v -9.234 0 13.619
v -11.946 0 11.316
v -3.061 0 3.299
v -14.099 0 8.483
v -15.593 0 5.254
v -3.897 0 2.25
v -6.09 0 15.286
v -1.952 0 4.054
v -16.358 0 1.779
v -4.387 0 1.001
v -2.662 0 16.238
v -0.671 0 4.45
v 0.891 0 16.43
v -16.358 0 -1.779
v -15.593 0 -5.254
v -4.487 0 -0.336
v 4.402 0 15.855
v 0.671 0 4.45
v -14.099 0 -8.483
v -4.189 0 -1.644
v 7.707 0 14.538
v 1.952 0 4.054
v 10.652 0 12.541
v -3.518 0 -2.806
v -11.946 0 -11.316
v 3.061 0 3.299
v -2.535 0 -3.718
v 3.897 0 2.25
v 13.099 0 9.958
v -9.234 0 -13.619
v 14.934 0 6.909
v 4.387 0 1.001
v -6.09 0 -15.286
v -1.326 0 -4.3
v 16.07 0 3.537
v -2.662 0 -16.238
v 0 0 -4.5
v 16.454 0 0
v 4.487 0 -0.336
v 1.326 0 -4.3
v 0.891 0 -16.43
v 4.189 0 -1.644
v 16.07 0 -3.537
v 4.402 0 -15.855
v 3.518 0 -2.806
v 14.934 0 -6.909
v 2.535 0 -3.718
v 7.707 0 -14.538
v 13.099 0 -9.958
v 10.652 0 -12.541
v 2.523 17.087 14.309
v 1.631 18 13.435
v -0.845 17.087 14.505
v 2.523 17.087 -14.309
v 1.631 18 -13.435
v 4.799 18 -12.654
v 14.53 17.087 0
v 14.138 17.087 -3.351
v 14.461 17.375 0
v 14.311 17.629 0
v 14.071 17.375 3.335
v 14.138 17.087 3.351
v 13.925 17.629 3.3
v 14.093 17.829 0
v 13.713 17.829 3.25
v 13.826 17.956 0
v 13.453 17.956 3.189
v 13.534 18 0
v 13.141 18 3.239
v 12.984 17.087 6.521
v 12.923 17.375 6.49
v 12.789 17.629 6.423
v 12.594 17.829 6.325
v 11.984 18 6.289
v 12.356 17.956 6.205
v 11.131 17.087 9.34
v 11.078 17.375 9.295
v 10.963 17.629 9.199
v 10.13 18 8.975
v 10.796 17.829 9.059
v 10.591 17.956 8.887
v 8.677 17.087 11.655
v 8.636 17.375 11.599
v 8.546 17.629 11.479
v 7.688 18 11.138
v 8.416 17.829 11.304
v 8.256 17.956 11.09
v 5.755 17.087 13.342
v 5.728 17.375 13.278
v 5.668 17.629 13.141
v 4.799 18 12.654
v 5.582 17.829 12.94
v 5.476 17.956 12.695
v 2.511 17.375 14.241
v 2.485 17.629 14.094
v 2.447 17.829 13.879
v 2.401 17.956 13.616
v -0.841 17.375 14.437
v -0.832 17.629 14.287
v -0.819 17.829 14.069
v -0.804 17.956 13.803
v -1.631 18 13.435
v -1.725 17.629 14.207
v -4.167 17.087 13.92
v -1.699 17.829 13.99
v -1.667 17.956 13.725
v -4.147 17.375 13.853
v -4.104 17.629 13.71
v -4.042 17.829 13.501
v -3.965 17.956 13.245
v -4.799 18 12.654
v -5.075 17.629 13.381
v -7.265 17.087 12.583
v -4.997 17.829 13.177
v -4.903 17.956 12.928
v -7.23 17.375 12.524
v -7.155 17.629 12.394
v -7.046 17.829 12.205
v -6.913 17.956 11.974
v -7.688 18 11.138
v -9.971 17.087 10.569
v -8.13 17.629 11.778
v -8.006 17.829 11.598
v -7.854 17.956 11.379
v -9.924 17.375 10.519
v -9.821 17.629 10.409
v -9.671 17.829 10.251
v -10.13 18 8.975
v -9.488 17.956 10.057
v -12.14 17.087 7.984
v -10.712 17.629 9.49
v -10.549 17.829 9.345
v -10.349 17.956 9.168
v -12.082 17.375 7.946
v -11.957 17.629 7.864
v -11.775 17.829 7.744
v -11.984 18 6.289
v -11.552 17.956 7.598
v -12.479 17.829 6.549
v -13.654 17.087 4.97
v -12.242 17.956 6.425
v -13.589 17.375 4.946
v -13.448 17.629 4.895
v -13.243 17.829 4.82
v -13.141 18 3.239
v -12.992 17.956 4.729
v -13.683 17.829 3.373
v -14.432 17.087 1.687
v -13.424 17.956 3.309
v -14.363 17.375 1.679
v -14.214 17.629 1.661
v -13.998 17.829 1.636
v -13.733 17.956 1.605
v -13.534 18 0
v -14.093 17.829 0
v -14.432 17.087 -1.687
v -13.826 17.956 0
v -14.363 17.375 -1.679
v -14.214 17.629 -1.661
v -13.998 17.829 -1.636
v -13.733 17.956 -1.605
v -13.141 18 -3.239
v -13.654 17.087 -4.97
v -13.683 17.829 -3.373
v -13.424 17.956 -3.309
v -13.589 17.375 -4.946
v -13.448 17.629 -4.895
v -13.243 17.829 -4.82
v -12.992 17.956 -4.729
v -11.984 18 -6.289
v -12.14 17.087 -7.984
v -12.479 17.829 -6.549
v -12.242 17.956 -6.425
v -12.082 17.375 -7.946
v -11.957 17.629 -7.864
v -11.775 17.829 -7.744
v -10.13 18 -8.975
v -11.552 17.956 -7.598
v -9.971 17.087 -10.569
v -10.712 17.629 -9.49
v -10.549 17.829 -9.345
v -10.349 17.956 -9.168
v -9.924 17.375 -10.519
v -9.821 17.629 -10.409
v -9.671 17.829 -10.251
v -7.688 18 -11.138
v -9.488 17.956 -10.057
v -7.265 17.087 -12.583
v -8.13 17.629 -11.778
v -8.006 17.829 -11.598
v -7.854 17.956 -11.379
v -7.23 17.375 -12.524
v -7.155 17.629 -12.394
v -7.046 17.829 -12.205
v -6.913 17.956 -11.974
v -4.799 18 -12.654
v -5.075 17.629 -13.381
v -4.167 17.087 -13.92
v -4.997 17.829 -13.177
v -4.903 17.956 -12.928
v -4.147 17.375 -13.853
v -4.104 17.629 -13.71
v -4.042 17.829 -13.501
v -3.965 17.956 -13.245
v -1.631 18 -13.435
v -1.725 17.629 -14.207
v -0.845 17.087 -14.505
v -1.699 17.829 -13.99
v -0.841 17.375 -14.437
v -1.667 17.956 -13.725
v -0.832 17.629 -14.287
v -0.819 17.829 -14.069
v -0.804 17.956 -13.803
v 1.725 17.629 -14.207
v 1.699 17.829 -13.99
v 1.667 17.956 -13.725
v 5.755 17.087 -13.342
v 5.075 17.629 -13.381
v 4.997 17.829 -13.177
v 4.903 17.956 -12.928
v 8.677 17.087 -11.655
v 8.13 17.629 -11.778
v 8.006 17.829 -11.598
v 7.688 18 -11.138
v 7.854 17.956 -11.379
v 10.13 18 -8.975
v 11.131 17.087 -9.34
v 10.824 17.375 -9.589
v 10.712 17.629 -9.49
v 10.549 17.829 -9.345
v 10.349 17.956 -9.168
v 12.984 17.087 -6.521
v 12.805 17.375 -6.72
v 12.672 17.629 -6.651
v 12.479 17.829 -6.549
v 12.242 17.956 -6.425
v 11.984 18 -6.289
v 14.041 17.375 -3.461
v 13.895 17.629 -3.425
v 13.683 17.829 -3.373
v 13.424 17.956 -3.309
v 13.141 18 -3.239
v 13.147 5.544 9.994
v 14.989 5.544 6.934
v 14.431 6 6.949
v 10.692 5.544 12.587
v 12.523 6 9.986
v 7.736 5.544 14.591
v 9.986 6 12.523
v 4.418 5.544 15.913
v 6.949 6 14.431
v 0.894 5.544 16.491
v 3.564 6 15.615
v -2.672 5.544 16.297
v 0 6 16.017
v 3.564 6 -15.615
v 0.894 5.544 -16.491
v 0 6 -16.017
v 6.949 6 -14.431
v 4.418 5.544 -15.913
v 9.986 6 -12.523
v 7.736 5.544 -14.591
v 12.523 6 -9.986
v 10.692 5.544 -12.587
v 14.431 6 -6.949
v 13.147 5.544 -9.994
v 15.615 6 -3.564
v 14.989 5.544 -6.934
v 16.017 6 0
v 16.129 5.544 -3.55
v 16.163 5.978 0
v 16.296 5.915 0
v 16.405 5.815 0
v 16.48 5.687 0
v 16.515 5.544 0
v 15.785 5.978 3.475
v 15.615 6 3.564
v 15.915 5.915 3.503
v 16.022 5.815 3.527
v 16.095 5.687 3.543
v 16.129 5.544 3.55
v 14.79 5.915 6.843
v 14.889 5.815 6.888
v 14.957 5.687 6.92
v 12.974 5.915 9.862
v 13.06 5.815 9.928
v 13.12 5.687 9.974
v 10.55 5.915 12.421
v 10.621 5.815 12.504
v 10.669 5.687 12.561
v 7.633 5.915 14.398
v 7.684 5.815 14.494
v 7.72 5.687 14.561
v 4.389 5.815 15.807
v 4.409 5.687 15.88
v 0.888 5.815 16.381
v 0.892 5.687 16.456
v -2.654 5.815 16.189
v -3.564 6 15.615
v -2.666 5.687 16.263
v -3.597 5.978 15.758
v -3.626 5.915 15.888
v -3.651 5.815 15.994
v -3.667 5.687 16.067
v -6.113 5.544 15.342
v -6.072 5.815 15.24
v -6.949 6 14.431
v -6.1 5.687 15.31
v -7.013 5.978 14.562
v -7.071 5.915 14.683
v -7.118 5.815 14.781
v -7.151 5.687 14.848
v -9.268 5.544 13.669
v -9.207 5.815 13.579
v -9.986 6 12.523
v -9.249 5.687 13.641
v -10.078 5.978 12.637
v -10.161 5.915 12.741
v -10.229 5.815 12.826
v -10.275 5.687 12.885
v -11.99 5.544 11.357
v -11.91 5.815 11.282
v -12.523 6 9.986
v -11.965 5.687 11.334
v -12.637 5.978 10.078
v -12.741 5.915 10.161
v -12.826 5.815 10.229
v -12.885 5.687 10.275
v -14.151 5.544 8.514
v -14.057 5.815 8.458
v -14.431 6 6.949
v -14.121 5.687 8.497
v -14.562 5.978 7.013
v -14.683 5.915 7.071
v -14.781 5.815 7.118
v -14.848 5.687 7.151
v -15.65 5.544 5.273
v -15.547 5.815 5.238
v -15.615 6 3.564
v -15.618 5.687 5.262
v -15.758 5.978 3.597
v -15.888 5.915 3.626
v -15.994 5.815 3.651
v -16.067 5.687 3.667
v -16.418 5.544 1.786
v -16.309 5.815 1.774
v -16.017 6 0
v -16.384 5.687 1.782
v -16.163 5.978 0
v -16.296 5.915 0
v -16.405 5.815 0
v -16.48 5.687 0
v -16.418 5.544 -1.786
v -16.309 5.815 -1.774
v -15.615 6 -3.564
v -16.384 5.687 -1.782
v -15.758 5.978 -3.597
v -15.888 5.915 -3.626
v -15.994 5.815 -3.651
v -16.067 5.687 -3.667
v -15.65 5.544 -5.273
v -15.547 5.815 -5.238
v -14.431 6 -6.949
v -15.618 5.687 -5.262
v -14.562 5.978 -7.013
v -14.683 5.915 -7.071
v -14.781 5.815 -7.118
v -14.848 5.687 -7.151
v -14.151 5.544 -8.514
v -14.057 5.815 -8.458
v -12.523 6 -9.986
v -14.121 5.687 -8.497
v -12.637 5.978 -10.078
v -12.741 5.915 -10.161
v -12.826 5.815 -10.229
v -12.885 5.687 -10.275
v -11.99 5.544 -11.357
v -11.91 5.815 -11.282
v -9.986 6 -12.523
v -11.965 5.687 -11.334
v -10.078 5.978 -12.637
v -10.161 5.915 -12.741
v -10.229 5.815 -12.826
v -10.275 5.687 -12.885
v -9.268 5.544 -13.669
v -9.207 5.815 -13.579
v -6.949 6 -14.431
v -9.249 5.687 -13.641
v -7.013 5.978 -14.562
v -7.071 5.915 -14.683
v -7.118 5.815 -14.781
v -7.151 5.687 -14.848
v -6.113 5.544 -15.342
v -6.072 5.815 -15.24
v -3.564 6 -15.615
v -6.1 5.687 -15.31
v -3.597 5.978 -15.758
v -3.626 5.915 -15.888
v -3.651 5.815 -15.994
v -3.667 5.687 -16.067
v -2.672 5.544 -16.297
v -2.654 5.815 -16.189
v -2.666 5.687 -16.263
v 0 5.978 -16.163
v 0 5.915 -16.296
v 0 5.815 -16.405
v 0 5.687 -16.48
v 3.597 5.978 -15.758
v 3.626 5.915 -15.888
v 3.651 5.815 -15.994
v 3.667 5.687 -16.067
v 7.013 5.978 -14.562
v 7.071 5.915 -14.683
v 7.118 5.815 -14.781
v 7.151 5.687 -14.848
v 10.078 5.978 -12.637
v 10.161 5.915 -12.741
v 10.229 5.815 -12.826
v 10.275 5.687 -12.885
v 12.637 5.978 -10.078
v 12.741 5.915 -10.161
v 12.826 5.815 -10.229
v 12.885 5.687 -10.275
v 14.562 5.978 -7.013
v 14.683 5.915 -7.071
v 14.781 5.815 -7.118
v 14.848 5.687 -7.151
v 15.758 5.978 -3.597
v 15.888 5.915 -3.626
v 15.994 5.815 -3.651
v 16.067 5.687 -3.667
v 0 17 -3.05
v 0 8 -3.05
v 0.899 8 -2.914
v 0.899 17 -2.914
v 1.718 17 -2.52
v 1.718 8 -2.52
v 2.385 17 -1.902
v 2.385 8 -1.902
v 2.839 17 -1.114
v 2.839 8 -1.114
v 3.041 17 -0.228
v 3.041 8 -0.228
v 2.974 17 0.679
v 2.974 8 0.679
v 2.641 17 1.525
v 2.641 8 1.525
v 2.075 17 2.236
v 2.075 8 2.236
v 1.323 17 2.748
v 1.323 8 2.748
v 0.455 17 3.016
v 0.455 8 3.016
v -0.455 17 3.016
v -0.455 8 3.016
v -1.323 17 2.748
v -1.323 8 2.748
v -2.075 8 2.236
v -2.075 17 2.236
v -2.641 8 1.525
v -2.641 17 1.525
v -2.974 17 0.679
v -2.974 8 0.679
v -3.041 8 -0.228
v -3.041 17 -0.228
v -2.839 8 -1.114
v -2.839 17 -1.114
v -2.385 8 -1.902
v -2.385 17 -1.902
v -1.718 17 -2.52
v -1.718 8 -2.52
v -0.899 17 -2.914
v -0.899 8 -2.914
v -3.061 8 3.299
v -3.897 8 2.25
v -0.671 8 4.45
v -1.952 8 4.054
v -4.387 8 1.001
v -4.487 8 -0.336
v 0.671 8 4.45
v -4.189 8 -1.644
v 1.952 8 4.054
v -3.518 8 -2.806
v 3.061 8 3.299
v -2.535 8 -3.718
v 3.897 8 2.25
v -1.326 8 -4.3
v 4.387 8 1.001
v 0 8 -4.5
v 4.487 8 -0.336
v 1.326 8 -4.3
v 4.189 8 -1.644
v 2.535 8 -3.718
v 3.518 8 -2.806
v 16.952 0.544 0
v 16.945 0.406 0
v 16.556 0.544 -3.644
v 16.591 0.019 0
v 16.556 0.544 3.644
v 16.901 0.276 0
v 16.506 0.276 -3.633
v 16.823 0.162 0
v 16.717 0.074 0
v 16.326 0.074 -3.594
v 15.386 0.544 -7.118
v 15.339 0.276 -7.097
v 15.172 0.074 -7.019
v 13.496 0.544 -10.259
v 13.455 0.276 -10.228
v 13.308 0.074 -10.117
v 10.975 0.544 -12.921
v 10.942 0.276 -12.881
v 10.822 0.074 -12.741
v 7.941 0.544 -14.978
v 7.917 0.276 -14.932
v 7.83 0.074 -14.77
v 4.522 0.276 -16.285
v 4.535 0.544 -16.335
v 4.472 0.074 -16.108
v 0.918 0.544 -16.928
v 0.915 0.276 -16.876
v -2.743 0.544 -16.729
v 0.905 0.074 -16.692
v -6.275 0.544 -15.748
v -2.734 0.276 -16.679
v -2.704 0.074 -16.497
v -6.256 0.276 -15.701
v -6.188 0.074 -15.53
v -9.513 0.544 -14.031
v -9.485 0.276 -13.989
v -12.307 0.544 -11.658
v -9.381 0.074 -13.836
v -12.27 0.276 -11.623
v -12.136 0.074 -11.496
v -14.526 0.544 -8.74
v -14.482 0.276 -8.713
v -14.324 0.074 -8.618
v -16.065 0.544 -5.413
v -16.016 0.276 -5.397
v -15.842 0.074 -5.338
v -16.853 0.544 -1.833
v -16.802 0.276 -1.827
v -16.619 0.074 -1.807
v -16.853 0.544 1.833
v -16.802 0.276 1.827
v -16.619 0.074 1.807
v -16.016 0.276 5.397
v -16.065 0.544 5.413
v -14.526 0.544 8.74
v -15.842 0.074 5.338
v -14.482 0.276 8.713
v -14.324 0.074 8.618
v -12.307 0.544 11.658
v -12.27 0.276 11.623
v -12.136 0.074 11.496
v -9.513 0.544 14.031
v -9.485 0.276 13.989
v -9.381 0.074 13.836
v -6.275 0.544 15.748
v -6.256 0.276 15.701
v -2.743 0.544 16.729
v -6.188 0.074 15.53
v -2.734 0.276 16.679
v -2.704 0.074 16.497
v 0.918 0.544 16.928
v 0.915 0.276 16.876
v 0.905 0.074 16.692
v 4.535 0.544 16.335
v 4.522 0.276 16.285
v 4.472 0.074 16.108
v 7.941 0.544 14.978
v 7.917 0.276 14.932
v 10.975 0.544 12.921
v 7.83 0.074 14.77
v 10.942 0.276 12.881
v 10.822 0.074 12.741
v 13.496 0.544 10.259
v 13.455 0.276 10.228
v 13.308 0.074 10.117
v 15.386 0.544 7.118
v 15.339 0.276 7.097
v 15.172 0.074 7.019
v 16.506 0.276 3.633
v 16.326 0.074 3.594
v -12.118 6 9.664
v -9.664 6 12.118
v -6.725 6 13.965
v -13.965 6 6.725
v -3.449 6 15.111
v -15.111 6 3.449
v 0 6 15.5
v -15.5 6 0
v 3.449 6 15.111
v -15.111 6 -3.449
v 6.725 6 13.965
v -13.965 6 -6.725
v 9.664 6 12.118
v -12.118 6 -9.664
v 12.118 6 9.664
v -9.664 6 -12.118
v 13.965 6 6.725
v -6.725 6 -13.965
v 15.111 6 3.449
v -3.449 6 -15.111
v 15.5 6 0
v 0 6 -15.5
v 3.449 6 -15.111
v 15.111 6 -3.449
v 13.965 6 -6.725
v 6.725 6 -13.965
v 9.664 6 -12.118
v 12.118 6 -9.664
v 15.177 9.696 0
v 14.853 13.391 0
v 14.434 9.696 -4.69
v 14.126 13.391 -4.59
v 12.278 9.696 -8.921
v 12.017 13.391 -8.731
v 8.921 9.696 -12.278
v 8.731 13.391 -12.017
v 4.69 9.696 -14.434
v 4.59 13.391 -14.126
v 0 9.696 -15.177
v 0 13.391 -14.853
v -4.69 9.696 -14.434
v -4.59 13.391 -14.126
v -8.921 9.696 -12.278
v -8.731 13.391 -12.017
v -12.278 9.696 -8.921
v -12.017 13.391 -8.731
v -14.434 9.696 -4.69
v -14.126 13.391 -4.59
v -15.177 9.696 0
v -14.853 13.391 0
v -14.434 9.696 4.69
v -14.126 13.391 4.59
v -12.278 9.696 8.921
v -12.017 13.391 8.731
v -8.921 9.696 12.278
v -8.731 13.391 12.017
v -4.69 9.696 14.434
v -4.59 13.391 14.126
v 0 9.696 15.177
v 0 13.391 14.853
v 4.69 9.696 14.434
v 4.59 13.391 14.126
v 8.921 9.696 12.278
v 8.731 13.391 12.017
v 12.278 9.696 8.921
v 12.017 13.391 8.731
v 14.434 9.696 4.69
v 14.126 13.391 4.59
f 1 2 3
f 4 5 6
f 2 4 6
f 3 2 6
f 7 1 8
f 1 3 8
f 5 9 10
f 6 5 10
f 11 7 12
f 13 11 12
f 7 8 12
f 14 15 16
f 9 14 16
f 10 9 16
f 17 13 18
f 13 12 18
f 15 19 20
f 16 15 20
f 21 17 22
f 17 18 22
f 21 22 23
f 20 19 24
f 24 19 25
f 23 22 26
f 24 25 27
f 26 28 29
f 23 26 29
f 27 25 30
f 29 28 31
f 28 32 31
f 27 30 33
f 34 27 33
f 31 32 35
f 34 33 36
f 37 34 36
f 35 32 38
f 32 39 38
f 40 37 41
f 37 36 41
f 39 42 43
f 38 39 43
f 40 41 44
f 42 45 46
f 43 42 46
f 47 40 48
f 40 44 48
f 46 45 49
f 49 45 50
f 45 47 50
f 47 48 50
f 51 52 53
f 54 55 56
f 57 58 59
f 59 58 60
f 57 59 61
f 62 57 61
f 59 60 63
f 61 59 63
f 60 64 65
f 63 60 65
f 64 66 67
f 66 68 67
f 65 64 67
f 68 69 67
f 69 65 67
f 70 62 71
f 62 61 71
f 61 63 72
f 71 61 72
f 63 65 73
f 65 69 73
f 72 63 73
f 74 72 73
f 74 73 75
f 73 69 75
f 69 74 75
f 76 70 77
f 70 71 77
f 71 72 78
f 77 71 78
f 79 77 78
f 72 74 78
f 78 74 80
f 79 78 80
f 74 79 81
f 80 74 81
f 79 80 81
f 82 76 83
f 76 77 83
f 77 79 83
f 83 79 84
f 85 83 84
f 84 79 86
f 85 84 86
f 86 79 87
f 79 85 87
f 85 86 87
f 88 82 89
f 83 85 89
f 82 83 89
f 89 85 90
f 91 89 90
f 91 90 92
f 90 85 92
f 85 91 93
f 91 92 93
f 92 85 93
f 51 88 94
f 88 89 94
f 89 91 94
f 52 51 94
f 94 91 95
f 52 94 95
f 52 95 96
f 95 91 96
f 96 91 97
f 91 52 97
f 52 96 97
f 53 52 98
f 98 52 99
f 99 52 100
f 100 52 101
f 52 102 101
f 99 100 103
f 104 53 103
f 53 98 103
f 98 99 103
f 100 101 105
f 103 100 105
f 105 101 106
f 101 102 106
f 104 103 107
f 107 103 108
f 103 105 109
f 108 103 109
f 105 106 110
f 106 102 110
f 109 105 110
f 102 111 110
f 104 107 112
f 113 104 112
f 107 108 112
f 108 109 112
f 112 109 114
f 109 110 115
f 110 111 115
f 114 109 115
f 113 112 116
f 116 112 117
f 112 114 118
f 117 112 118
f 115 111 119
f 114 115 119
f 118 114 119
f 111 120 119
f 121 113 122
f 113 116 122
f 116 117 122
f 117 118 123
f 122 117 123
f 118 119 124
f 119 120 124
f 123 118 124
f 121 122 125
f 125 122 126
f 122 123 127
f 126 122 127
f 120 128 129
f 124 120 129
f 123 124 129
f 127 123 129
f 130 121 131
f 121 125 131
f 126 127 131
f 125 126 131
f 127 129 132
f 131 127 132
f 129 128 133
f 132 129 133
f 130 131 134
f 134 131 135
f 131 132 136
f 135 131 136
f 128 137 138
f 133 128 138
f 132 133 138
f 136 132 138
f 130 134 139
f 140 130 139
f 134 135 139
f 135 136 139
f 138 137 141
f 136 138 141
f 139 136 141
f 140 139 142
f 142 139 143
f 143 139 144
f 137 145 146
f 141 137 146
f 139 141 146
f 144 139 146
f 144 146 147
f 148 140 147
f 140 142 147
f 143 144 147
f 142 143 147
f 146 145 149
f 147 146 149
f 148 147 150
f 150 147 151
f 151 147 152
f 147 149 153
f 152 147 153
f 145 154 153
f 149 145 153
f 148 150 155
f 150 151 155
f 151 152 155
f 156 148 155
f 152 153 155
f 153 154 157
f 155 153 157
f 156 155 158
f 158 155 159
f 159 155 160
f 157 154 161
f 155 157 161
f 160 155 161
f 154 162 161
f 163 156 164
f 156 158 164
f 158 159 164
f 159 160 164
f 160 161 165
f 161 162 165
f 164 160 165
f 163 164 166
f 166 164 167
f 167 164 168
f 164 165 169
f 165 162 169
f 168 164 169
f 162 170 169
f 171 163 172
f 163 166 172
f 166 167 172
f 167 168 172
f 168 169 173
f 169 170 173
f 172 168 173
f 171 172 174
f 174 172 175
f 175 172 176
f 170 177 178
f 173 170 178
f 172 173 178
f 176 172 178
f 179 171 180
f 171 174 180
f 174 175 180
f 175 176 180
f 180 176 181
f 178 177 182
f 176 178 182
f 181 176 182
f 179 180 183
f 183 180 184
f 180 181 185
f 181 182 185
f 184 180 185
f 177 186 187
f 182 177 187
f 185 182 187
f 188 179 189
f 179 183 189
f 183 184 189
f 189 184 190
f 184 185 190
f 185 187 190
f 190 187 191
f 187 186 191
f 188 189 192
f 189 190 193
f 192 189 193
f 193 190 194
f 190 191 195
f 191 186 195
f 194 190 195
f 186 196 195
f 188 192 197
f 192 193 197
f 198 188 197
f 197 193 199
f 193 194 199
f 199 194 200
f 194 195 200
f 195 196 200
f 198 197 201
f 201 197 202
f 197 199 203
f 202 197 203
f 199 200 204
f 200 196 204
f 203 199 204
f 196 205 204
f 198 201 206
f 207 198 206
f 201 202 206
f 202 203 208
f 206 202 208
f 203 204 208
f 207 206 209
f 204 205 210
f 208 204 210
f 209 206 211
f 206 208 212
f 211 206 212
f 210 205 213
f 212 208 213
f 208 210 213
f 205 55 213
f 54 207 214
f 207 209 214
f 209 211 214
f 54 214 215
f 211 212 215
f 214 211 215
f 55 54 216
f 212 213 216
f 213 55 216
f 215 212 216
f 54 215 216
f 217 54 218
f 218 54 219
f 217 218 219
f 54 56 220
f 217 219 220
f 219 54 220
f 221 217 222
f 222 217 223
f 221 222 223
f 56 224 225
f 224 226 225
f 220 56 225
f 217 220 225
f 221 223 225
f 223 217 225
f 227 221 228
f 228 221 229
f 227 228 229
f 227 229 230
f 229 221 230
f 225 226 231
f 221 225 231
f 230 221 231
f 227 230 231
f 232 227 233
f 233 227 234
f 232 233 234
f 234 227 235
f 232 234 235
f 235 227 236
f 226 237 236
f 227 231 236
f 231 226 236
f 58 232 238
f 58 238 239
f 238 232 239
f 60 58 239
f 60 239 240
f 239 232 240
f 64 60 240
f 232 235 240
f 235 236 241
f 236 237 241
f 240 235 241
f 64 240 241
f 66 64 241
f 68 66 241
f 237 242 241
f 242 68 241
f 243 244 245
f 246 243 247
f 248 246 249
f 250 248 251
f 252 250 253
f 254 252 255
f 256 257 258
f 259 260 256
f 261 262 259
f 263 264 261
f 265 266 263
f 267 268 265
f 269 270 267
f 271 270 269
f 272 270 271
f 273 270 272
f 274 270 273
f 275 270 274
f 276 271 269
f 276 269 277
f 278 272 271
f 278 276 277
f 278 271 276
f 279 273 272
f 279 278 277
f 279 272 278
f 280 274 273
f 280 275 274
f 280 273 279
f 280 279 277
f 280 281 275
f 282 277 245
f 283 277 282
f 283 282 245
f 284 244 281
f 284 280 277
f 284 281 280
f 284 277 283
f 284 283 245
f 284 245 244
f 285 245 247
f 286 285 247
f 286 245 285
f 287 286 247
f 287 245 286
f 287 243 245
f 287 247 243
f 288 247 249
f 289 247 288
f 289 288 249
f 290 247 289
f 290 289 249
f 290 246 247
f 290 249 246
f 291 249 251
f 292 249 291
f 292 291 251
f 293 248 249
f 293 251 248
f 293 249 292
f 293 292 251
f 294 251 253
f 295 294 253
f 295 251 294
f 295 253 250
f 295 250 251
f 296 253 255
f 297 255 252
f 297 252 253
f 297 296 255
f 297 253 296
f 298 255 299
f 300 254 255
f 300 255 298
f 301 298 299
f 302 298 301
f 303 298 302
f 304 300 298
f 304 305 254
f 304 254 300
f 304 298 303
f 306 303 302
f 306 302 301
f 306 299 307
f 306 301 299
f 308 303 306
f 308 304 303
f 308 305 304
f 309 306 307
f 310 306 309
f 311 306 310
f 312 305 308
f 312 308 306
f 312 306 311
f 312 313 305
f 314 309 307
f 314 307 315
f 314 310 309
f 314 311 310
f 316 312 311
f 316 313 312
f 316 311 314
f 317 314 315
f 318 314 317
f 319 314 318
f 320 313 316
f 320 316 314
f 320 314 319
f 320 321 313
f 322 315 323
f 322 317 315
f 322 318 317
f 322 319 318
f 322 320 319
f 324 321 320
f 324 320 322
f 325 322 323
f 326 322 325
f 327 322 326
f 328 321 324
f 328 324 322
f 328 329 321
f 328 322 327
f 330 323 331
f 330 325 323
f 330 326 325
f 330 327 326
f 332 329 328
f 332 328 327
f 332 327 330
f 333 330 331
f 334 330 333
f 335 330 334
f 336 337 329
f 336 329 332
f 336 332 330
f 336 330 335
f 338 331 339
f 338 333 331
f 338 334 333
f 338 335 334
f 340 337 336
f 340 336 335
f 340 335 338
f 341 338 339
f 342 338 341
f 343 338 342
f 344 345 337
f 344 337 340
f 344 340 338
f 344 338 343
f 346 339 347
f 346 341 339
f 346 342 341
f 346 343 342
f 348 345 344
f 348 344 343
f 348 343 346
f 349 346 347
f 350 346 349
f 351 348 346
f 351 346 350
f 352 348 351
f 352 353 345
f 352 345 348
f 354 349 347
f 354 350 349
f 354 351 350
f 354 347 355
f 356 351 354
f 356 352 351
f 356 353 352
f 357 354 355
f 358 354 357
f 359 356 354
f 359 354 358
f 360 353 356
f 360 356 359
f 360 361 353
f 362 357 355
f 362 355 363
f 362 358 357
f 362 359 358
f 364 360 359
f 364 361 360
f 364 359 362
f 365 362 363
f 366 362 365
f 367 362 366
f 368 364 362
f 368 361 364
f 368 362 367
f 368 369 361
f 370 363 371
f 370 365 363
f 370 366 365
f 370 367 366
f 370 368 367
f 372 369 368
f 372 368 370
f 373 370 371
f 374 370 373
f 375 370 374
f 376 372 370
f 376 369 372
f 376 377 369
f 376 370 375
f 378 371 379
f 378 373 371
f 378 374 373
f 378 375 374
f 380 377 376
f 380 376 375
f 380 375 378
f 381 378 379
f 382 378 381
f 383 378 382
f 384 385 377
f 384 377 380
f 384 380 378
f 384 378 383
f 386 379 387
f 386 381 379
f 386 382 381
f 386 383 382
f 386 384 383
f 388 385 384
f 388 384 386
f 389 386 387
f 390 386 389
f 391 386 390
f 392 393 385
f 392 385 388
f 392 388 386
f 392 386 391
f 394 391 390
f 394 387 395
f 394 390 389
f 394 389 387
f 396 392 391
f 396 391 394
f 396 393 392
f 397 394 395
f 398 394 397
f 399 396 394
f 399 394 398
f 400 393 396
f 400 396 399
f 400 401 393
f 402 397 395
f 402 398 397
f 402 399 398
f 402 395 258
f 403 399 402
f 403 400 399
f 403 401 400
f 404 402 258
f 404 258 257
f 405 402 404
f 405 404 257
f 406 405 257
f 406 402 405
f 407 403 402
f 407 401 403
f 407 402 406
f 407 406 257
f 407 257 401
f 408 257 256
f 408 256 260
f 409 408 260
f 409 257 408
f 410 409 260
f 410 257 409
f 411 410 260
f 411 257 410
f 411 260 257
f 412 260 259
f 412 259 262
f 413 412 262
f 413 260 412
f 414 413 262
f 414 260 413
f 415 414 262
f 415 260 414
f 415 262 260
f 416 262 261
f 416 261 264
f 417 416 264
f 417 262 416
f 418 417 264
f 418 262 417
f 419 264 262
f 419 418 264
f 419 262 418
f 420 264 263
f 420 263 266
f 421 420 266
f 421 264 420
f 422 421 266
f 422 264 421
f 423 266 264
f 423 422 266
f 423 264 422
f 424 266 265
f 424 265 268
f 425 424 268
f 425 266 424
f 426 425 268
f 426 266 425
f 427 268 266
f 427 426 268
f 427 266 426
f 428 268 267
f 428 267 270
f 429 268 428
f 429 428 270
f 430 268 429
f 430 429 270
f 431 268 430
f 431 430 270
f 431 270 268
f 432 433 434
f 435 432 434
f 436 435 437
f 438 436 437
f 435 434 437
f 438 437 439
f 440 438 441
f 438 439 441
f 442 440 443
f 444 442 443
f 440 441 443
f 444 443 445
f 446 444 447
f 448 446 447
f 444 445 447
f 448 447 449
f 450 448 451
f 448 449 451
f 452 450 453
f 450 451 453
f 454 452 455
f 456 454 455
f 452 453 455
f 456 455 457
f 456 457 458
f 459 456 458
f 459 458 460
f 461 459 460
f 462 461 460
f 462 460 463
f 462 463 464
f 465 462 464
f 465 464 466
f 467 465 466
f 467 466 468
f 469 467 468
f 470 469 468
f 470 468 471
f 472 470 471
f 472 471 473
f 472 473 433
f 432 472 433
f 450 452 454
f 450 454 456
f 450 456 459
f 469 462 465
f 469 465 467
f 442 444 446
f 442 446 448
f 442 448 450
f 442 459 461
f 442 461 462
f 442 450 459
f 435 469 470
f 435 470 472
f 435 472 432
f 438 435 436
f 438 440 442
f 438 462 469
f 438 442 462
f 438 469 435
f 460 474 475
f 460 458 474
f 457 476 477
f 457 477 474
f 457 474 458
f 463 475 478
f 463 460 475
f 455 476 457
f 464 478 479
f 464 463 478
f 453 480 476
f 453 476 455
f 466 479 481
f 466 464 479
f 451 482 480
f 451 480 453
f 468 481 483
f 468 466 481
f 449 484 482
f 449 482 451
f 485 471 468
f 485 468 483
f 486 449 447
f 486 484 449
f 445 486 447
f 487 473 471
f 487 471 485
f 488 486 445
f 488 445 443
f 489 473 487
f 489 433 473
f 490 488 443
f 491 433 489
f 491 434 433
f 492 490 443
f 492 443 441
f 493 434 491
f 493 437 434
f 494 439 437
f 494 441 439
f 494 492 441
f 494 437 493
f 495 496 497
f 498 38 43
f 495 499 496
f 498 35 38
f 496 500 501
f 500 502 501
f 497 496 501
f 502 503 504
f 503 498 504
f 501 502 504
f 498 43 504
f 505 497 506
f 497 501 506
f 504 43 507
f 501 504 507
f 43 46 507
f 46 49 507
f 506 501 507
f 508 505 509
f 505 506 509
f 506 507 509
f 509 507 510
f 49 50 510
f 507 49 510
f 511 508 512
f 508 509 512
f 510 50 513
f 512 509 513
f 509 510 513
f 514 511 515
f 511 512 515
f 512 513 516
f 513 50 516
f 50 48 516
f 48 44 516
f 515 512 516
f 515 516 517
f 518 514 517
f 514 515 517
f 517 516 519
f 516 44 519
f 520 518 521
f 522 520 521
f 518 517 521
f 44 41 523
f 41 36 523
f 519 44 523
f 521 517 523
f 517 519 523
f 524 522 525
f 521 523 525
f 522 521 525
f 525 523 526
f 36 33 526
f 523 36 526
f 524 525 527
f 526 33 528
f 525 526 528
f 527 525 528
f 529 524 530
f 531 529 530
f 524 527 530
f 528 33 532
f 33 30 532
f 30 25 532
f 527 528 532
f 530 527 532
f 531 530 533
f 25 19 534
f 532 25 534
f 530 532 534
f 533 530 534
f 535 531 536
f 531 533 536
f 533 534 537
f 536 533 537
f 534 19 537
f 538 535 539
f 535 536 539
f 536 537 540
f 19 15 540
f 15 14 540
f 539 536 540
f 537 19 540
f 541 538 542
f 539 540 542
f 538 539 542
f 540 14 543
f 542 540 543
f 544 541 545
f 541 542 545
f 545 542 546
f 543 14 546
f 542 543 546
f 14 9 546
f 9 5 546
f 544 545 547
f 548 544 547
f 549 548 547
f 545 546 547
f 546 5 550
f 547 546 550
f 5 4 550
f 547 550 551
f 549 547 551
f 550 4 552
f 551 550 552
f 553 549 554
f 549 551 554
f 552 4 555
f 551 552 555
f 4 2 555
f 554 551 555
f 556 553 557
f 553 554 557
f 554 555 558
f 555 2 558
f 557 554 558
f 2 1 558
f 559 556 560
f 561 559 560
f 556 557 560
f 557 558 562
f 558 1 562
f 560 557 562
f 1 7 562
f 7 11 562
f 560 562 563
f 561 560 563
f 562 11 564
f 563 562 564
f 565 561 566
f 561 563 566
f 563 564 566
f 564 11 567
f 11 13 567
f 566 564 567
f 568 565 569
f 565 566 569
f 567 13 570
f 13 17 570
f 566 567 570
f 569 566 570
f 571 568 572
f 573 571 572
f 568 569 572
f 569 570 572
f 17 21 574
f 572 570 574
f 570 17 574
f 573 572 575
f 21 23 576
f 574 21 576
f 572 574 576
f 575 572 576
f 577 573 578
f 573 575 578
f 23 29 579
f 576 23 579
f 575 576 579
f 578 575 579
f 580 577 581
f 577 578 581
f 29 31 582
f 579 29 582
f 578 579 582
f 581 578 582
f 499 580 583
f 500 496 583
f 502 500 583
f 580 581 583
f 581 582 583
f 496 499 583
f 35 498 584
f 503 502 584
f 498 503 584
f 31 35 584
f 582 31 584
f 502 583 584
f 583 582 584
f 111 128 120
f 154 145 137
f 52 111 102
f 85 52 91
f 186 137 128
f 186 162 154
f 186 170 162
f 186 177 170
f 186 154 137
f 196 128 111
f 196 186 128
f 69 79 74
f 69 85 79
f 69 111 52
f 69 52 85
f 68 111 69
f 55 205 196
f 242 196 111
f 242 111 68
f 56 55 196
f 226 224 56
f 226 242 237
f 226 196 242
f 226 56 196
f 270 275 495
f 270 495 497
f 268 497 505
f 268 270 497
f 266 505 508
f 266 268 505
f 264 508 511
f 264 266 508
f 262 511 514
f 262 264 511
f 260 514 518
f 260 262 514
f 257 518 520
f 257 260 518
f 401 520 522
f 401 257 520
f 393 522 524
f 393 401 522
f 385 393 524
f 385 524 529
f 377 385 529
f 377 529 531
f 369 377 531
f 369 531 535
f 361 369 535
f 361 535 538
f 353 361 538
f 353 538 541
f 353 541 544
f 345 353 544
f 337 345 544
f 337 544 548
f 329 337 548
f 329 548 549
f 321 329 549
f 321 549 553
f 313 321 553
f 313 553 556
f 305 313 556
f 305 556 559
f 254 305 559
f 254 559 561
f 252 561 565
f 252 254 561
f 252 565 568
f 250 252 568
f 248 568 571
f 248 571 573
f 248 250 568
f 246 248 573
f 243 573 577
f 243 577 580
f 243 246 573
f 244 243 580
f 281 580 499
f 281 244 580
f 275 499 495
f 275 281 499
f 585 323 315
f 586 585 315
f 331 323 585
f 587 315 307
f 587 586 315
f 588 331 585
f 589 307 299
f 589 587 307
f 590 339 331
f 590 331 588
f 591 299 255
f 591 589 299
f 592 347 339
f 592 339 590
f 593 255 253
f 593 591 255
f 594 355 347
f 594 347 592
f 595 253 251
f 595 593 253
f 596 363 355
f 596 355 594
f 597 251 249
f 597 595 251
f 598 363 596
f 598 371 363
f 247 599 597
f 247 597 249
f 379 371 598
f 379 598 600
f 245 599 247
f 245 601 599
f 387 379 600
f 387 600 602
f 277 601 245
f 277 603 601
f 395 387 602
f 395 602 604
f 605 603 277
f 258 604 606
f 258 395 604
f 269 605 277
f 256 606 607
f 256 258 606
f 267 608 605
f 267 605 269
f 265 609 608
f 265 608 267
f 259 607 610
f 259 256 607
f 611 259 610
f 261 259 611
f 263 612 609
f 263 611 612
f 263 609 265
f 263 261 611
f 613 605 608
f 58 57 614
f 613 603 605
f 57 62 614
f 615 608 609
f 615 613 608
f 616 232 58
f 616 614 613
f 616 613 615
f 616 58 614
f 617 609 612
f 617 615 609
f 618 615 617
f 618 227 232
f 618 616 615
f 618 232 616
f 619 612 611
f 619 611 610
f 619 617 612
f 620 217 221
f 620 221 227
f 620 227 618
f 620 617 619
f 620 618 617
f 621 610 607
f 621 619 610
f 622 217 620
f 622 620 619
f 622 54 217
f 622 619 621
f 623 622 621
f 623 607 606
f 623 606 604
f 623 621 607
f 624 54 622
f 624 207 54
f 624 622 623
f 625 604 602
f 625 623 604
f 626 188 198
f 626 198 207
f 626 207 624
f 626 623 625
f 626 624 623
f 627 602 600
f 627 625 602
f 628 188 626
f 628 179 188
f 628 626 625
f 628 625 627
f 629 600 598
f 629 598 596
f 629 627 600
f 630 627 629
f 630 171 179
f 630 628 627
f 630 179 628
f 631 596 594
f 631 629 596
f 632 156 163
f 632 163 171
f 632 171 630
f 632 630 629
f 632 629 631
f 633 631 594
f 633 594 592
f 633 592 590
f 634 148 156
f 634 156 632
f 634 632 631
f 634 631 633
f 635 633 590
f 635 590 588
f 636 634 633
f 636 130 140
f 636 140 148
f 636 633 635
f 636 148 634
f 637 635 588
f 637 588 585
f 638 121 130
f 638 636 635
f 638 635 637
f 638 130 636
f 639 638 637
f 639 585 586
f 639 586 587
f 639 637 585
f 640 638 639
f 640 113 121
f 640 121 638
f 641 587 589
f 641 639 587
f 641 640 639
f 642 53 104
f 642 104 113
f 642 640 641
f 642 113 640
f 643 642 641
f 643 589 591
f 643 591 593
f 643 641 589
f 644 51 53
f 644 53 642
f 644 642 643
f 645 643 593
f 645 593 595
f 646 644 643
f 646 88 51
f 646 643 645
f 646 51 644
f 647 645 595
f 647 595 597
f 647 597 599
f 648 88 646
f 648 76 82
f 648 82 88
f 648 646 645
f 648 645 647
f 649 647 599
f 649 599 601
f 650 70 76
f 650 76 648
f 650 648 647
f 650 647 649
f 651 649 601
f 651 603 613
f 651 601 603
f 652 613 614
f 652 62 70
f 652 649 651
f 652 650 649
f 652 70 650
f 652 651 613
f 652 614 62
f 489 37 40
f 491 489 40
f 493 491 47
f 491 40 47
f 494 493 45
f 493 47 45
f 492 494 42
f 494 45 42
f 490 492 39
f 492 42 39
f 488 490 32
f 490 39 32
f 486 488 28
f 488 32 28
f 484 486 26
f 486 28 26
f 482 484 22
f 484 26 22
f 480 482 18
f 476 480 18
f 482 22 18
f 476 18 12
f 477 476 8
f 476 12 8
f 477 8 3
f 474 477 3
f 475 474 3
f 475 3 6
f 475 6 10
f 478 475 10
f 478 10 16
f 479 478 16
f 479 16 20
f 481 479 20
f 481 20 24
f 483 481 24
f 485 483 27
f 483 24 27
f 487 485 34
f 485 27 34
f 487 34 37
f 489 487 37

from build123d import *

# Parameters (mm, degrees)
SKETCH1_R           = 17
BOSS_EXTRUDE1_DEPTH = 6
BOSS_EXTRUDE1_TAPER = 5
SKETCH2_R           = 15.5
BOSS_EXTRUDE2_DEPTH = 12
BOSS_EXTRUDE2_TAPER = 5
SKETCH3_R           = 3.05
CUT_EXTRUDE1_DEPTH  = 17
FILLET1_R           = 1
FILLET2_R           = 0.5
SKETCH8_R           = 4.5
CUT_EXTRUDE6_DEPTH  = 8
FILLET3_R           = 0.5


with BuildPart() as part:
    # Sketch1 → Boss-Extrude1 (new body)
    with BuildSketch(Plane(origin=(0, 0, 0), x_dir=(1, 0, 0), z_dir=(0, 1, 0))):
        Circle(SKETCH1_R)
    extrude(amount=BOSS_EXTRUDE1_DEPTH, taper=BOSS_EXTRUDE1_TAPER)

    # Sketch2 → Boss-Extrude2 (add)
    with BuildSketch(Plane(origin=(0, 6, 0), x_dir=(1, 0, 0), z_dir=(0, 1, 0))):
        Circle(SKETCH2_R)
    extrude(amount=BOSS_EXTRUDE2_DEPTH, taper=BOSS_EXTRUDE2_TAPER)

    # Sketch3 → Cut-Extrude1 (cut)
    with BuildSketch(Plane.XZ):
        Circle(SKETCH3_R)
    extrude(amount=-CUT_EXTRUDE1_DEPTH, mode=Mode.SUBTRACT)

    # Fillet1
    fillet1_edges = [part.edges().sort_by_distance(p)[0] for p in [
        (-14.450136038, 18, 0),
    ]]
    fillet(fillet1_edges, radius=FILLET1_R)

    # Fillet2
    fillet2_edges = [part.edges().sort_by_distance(p)[0] for p in [
        (-16.475068019, 6, 0),
    ]]
    fillet(fillet2_edges, radius=FILLET2_R)

    # Sketch8 → Cut-Extrude6 (cut)
    with BuildSketch(Plane.XZ):
        Circle(SKETCH8_R)
    extrude(amount=-CUT_EXTRUDE6_DEPTH, mode=Mode.SUBTRACT)

    # Fillet3
    fillet3_edges = [part.edges().sort_by_distance(p)[0] for p in [
        (-17, 0, 0),
    ]]
    fillet(fillet3_edges, radius=FILLET3_R)


solid = part.part
